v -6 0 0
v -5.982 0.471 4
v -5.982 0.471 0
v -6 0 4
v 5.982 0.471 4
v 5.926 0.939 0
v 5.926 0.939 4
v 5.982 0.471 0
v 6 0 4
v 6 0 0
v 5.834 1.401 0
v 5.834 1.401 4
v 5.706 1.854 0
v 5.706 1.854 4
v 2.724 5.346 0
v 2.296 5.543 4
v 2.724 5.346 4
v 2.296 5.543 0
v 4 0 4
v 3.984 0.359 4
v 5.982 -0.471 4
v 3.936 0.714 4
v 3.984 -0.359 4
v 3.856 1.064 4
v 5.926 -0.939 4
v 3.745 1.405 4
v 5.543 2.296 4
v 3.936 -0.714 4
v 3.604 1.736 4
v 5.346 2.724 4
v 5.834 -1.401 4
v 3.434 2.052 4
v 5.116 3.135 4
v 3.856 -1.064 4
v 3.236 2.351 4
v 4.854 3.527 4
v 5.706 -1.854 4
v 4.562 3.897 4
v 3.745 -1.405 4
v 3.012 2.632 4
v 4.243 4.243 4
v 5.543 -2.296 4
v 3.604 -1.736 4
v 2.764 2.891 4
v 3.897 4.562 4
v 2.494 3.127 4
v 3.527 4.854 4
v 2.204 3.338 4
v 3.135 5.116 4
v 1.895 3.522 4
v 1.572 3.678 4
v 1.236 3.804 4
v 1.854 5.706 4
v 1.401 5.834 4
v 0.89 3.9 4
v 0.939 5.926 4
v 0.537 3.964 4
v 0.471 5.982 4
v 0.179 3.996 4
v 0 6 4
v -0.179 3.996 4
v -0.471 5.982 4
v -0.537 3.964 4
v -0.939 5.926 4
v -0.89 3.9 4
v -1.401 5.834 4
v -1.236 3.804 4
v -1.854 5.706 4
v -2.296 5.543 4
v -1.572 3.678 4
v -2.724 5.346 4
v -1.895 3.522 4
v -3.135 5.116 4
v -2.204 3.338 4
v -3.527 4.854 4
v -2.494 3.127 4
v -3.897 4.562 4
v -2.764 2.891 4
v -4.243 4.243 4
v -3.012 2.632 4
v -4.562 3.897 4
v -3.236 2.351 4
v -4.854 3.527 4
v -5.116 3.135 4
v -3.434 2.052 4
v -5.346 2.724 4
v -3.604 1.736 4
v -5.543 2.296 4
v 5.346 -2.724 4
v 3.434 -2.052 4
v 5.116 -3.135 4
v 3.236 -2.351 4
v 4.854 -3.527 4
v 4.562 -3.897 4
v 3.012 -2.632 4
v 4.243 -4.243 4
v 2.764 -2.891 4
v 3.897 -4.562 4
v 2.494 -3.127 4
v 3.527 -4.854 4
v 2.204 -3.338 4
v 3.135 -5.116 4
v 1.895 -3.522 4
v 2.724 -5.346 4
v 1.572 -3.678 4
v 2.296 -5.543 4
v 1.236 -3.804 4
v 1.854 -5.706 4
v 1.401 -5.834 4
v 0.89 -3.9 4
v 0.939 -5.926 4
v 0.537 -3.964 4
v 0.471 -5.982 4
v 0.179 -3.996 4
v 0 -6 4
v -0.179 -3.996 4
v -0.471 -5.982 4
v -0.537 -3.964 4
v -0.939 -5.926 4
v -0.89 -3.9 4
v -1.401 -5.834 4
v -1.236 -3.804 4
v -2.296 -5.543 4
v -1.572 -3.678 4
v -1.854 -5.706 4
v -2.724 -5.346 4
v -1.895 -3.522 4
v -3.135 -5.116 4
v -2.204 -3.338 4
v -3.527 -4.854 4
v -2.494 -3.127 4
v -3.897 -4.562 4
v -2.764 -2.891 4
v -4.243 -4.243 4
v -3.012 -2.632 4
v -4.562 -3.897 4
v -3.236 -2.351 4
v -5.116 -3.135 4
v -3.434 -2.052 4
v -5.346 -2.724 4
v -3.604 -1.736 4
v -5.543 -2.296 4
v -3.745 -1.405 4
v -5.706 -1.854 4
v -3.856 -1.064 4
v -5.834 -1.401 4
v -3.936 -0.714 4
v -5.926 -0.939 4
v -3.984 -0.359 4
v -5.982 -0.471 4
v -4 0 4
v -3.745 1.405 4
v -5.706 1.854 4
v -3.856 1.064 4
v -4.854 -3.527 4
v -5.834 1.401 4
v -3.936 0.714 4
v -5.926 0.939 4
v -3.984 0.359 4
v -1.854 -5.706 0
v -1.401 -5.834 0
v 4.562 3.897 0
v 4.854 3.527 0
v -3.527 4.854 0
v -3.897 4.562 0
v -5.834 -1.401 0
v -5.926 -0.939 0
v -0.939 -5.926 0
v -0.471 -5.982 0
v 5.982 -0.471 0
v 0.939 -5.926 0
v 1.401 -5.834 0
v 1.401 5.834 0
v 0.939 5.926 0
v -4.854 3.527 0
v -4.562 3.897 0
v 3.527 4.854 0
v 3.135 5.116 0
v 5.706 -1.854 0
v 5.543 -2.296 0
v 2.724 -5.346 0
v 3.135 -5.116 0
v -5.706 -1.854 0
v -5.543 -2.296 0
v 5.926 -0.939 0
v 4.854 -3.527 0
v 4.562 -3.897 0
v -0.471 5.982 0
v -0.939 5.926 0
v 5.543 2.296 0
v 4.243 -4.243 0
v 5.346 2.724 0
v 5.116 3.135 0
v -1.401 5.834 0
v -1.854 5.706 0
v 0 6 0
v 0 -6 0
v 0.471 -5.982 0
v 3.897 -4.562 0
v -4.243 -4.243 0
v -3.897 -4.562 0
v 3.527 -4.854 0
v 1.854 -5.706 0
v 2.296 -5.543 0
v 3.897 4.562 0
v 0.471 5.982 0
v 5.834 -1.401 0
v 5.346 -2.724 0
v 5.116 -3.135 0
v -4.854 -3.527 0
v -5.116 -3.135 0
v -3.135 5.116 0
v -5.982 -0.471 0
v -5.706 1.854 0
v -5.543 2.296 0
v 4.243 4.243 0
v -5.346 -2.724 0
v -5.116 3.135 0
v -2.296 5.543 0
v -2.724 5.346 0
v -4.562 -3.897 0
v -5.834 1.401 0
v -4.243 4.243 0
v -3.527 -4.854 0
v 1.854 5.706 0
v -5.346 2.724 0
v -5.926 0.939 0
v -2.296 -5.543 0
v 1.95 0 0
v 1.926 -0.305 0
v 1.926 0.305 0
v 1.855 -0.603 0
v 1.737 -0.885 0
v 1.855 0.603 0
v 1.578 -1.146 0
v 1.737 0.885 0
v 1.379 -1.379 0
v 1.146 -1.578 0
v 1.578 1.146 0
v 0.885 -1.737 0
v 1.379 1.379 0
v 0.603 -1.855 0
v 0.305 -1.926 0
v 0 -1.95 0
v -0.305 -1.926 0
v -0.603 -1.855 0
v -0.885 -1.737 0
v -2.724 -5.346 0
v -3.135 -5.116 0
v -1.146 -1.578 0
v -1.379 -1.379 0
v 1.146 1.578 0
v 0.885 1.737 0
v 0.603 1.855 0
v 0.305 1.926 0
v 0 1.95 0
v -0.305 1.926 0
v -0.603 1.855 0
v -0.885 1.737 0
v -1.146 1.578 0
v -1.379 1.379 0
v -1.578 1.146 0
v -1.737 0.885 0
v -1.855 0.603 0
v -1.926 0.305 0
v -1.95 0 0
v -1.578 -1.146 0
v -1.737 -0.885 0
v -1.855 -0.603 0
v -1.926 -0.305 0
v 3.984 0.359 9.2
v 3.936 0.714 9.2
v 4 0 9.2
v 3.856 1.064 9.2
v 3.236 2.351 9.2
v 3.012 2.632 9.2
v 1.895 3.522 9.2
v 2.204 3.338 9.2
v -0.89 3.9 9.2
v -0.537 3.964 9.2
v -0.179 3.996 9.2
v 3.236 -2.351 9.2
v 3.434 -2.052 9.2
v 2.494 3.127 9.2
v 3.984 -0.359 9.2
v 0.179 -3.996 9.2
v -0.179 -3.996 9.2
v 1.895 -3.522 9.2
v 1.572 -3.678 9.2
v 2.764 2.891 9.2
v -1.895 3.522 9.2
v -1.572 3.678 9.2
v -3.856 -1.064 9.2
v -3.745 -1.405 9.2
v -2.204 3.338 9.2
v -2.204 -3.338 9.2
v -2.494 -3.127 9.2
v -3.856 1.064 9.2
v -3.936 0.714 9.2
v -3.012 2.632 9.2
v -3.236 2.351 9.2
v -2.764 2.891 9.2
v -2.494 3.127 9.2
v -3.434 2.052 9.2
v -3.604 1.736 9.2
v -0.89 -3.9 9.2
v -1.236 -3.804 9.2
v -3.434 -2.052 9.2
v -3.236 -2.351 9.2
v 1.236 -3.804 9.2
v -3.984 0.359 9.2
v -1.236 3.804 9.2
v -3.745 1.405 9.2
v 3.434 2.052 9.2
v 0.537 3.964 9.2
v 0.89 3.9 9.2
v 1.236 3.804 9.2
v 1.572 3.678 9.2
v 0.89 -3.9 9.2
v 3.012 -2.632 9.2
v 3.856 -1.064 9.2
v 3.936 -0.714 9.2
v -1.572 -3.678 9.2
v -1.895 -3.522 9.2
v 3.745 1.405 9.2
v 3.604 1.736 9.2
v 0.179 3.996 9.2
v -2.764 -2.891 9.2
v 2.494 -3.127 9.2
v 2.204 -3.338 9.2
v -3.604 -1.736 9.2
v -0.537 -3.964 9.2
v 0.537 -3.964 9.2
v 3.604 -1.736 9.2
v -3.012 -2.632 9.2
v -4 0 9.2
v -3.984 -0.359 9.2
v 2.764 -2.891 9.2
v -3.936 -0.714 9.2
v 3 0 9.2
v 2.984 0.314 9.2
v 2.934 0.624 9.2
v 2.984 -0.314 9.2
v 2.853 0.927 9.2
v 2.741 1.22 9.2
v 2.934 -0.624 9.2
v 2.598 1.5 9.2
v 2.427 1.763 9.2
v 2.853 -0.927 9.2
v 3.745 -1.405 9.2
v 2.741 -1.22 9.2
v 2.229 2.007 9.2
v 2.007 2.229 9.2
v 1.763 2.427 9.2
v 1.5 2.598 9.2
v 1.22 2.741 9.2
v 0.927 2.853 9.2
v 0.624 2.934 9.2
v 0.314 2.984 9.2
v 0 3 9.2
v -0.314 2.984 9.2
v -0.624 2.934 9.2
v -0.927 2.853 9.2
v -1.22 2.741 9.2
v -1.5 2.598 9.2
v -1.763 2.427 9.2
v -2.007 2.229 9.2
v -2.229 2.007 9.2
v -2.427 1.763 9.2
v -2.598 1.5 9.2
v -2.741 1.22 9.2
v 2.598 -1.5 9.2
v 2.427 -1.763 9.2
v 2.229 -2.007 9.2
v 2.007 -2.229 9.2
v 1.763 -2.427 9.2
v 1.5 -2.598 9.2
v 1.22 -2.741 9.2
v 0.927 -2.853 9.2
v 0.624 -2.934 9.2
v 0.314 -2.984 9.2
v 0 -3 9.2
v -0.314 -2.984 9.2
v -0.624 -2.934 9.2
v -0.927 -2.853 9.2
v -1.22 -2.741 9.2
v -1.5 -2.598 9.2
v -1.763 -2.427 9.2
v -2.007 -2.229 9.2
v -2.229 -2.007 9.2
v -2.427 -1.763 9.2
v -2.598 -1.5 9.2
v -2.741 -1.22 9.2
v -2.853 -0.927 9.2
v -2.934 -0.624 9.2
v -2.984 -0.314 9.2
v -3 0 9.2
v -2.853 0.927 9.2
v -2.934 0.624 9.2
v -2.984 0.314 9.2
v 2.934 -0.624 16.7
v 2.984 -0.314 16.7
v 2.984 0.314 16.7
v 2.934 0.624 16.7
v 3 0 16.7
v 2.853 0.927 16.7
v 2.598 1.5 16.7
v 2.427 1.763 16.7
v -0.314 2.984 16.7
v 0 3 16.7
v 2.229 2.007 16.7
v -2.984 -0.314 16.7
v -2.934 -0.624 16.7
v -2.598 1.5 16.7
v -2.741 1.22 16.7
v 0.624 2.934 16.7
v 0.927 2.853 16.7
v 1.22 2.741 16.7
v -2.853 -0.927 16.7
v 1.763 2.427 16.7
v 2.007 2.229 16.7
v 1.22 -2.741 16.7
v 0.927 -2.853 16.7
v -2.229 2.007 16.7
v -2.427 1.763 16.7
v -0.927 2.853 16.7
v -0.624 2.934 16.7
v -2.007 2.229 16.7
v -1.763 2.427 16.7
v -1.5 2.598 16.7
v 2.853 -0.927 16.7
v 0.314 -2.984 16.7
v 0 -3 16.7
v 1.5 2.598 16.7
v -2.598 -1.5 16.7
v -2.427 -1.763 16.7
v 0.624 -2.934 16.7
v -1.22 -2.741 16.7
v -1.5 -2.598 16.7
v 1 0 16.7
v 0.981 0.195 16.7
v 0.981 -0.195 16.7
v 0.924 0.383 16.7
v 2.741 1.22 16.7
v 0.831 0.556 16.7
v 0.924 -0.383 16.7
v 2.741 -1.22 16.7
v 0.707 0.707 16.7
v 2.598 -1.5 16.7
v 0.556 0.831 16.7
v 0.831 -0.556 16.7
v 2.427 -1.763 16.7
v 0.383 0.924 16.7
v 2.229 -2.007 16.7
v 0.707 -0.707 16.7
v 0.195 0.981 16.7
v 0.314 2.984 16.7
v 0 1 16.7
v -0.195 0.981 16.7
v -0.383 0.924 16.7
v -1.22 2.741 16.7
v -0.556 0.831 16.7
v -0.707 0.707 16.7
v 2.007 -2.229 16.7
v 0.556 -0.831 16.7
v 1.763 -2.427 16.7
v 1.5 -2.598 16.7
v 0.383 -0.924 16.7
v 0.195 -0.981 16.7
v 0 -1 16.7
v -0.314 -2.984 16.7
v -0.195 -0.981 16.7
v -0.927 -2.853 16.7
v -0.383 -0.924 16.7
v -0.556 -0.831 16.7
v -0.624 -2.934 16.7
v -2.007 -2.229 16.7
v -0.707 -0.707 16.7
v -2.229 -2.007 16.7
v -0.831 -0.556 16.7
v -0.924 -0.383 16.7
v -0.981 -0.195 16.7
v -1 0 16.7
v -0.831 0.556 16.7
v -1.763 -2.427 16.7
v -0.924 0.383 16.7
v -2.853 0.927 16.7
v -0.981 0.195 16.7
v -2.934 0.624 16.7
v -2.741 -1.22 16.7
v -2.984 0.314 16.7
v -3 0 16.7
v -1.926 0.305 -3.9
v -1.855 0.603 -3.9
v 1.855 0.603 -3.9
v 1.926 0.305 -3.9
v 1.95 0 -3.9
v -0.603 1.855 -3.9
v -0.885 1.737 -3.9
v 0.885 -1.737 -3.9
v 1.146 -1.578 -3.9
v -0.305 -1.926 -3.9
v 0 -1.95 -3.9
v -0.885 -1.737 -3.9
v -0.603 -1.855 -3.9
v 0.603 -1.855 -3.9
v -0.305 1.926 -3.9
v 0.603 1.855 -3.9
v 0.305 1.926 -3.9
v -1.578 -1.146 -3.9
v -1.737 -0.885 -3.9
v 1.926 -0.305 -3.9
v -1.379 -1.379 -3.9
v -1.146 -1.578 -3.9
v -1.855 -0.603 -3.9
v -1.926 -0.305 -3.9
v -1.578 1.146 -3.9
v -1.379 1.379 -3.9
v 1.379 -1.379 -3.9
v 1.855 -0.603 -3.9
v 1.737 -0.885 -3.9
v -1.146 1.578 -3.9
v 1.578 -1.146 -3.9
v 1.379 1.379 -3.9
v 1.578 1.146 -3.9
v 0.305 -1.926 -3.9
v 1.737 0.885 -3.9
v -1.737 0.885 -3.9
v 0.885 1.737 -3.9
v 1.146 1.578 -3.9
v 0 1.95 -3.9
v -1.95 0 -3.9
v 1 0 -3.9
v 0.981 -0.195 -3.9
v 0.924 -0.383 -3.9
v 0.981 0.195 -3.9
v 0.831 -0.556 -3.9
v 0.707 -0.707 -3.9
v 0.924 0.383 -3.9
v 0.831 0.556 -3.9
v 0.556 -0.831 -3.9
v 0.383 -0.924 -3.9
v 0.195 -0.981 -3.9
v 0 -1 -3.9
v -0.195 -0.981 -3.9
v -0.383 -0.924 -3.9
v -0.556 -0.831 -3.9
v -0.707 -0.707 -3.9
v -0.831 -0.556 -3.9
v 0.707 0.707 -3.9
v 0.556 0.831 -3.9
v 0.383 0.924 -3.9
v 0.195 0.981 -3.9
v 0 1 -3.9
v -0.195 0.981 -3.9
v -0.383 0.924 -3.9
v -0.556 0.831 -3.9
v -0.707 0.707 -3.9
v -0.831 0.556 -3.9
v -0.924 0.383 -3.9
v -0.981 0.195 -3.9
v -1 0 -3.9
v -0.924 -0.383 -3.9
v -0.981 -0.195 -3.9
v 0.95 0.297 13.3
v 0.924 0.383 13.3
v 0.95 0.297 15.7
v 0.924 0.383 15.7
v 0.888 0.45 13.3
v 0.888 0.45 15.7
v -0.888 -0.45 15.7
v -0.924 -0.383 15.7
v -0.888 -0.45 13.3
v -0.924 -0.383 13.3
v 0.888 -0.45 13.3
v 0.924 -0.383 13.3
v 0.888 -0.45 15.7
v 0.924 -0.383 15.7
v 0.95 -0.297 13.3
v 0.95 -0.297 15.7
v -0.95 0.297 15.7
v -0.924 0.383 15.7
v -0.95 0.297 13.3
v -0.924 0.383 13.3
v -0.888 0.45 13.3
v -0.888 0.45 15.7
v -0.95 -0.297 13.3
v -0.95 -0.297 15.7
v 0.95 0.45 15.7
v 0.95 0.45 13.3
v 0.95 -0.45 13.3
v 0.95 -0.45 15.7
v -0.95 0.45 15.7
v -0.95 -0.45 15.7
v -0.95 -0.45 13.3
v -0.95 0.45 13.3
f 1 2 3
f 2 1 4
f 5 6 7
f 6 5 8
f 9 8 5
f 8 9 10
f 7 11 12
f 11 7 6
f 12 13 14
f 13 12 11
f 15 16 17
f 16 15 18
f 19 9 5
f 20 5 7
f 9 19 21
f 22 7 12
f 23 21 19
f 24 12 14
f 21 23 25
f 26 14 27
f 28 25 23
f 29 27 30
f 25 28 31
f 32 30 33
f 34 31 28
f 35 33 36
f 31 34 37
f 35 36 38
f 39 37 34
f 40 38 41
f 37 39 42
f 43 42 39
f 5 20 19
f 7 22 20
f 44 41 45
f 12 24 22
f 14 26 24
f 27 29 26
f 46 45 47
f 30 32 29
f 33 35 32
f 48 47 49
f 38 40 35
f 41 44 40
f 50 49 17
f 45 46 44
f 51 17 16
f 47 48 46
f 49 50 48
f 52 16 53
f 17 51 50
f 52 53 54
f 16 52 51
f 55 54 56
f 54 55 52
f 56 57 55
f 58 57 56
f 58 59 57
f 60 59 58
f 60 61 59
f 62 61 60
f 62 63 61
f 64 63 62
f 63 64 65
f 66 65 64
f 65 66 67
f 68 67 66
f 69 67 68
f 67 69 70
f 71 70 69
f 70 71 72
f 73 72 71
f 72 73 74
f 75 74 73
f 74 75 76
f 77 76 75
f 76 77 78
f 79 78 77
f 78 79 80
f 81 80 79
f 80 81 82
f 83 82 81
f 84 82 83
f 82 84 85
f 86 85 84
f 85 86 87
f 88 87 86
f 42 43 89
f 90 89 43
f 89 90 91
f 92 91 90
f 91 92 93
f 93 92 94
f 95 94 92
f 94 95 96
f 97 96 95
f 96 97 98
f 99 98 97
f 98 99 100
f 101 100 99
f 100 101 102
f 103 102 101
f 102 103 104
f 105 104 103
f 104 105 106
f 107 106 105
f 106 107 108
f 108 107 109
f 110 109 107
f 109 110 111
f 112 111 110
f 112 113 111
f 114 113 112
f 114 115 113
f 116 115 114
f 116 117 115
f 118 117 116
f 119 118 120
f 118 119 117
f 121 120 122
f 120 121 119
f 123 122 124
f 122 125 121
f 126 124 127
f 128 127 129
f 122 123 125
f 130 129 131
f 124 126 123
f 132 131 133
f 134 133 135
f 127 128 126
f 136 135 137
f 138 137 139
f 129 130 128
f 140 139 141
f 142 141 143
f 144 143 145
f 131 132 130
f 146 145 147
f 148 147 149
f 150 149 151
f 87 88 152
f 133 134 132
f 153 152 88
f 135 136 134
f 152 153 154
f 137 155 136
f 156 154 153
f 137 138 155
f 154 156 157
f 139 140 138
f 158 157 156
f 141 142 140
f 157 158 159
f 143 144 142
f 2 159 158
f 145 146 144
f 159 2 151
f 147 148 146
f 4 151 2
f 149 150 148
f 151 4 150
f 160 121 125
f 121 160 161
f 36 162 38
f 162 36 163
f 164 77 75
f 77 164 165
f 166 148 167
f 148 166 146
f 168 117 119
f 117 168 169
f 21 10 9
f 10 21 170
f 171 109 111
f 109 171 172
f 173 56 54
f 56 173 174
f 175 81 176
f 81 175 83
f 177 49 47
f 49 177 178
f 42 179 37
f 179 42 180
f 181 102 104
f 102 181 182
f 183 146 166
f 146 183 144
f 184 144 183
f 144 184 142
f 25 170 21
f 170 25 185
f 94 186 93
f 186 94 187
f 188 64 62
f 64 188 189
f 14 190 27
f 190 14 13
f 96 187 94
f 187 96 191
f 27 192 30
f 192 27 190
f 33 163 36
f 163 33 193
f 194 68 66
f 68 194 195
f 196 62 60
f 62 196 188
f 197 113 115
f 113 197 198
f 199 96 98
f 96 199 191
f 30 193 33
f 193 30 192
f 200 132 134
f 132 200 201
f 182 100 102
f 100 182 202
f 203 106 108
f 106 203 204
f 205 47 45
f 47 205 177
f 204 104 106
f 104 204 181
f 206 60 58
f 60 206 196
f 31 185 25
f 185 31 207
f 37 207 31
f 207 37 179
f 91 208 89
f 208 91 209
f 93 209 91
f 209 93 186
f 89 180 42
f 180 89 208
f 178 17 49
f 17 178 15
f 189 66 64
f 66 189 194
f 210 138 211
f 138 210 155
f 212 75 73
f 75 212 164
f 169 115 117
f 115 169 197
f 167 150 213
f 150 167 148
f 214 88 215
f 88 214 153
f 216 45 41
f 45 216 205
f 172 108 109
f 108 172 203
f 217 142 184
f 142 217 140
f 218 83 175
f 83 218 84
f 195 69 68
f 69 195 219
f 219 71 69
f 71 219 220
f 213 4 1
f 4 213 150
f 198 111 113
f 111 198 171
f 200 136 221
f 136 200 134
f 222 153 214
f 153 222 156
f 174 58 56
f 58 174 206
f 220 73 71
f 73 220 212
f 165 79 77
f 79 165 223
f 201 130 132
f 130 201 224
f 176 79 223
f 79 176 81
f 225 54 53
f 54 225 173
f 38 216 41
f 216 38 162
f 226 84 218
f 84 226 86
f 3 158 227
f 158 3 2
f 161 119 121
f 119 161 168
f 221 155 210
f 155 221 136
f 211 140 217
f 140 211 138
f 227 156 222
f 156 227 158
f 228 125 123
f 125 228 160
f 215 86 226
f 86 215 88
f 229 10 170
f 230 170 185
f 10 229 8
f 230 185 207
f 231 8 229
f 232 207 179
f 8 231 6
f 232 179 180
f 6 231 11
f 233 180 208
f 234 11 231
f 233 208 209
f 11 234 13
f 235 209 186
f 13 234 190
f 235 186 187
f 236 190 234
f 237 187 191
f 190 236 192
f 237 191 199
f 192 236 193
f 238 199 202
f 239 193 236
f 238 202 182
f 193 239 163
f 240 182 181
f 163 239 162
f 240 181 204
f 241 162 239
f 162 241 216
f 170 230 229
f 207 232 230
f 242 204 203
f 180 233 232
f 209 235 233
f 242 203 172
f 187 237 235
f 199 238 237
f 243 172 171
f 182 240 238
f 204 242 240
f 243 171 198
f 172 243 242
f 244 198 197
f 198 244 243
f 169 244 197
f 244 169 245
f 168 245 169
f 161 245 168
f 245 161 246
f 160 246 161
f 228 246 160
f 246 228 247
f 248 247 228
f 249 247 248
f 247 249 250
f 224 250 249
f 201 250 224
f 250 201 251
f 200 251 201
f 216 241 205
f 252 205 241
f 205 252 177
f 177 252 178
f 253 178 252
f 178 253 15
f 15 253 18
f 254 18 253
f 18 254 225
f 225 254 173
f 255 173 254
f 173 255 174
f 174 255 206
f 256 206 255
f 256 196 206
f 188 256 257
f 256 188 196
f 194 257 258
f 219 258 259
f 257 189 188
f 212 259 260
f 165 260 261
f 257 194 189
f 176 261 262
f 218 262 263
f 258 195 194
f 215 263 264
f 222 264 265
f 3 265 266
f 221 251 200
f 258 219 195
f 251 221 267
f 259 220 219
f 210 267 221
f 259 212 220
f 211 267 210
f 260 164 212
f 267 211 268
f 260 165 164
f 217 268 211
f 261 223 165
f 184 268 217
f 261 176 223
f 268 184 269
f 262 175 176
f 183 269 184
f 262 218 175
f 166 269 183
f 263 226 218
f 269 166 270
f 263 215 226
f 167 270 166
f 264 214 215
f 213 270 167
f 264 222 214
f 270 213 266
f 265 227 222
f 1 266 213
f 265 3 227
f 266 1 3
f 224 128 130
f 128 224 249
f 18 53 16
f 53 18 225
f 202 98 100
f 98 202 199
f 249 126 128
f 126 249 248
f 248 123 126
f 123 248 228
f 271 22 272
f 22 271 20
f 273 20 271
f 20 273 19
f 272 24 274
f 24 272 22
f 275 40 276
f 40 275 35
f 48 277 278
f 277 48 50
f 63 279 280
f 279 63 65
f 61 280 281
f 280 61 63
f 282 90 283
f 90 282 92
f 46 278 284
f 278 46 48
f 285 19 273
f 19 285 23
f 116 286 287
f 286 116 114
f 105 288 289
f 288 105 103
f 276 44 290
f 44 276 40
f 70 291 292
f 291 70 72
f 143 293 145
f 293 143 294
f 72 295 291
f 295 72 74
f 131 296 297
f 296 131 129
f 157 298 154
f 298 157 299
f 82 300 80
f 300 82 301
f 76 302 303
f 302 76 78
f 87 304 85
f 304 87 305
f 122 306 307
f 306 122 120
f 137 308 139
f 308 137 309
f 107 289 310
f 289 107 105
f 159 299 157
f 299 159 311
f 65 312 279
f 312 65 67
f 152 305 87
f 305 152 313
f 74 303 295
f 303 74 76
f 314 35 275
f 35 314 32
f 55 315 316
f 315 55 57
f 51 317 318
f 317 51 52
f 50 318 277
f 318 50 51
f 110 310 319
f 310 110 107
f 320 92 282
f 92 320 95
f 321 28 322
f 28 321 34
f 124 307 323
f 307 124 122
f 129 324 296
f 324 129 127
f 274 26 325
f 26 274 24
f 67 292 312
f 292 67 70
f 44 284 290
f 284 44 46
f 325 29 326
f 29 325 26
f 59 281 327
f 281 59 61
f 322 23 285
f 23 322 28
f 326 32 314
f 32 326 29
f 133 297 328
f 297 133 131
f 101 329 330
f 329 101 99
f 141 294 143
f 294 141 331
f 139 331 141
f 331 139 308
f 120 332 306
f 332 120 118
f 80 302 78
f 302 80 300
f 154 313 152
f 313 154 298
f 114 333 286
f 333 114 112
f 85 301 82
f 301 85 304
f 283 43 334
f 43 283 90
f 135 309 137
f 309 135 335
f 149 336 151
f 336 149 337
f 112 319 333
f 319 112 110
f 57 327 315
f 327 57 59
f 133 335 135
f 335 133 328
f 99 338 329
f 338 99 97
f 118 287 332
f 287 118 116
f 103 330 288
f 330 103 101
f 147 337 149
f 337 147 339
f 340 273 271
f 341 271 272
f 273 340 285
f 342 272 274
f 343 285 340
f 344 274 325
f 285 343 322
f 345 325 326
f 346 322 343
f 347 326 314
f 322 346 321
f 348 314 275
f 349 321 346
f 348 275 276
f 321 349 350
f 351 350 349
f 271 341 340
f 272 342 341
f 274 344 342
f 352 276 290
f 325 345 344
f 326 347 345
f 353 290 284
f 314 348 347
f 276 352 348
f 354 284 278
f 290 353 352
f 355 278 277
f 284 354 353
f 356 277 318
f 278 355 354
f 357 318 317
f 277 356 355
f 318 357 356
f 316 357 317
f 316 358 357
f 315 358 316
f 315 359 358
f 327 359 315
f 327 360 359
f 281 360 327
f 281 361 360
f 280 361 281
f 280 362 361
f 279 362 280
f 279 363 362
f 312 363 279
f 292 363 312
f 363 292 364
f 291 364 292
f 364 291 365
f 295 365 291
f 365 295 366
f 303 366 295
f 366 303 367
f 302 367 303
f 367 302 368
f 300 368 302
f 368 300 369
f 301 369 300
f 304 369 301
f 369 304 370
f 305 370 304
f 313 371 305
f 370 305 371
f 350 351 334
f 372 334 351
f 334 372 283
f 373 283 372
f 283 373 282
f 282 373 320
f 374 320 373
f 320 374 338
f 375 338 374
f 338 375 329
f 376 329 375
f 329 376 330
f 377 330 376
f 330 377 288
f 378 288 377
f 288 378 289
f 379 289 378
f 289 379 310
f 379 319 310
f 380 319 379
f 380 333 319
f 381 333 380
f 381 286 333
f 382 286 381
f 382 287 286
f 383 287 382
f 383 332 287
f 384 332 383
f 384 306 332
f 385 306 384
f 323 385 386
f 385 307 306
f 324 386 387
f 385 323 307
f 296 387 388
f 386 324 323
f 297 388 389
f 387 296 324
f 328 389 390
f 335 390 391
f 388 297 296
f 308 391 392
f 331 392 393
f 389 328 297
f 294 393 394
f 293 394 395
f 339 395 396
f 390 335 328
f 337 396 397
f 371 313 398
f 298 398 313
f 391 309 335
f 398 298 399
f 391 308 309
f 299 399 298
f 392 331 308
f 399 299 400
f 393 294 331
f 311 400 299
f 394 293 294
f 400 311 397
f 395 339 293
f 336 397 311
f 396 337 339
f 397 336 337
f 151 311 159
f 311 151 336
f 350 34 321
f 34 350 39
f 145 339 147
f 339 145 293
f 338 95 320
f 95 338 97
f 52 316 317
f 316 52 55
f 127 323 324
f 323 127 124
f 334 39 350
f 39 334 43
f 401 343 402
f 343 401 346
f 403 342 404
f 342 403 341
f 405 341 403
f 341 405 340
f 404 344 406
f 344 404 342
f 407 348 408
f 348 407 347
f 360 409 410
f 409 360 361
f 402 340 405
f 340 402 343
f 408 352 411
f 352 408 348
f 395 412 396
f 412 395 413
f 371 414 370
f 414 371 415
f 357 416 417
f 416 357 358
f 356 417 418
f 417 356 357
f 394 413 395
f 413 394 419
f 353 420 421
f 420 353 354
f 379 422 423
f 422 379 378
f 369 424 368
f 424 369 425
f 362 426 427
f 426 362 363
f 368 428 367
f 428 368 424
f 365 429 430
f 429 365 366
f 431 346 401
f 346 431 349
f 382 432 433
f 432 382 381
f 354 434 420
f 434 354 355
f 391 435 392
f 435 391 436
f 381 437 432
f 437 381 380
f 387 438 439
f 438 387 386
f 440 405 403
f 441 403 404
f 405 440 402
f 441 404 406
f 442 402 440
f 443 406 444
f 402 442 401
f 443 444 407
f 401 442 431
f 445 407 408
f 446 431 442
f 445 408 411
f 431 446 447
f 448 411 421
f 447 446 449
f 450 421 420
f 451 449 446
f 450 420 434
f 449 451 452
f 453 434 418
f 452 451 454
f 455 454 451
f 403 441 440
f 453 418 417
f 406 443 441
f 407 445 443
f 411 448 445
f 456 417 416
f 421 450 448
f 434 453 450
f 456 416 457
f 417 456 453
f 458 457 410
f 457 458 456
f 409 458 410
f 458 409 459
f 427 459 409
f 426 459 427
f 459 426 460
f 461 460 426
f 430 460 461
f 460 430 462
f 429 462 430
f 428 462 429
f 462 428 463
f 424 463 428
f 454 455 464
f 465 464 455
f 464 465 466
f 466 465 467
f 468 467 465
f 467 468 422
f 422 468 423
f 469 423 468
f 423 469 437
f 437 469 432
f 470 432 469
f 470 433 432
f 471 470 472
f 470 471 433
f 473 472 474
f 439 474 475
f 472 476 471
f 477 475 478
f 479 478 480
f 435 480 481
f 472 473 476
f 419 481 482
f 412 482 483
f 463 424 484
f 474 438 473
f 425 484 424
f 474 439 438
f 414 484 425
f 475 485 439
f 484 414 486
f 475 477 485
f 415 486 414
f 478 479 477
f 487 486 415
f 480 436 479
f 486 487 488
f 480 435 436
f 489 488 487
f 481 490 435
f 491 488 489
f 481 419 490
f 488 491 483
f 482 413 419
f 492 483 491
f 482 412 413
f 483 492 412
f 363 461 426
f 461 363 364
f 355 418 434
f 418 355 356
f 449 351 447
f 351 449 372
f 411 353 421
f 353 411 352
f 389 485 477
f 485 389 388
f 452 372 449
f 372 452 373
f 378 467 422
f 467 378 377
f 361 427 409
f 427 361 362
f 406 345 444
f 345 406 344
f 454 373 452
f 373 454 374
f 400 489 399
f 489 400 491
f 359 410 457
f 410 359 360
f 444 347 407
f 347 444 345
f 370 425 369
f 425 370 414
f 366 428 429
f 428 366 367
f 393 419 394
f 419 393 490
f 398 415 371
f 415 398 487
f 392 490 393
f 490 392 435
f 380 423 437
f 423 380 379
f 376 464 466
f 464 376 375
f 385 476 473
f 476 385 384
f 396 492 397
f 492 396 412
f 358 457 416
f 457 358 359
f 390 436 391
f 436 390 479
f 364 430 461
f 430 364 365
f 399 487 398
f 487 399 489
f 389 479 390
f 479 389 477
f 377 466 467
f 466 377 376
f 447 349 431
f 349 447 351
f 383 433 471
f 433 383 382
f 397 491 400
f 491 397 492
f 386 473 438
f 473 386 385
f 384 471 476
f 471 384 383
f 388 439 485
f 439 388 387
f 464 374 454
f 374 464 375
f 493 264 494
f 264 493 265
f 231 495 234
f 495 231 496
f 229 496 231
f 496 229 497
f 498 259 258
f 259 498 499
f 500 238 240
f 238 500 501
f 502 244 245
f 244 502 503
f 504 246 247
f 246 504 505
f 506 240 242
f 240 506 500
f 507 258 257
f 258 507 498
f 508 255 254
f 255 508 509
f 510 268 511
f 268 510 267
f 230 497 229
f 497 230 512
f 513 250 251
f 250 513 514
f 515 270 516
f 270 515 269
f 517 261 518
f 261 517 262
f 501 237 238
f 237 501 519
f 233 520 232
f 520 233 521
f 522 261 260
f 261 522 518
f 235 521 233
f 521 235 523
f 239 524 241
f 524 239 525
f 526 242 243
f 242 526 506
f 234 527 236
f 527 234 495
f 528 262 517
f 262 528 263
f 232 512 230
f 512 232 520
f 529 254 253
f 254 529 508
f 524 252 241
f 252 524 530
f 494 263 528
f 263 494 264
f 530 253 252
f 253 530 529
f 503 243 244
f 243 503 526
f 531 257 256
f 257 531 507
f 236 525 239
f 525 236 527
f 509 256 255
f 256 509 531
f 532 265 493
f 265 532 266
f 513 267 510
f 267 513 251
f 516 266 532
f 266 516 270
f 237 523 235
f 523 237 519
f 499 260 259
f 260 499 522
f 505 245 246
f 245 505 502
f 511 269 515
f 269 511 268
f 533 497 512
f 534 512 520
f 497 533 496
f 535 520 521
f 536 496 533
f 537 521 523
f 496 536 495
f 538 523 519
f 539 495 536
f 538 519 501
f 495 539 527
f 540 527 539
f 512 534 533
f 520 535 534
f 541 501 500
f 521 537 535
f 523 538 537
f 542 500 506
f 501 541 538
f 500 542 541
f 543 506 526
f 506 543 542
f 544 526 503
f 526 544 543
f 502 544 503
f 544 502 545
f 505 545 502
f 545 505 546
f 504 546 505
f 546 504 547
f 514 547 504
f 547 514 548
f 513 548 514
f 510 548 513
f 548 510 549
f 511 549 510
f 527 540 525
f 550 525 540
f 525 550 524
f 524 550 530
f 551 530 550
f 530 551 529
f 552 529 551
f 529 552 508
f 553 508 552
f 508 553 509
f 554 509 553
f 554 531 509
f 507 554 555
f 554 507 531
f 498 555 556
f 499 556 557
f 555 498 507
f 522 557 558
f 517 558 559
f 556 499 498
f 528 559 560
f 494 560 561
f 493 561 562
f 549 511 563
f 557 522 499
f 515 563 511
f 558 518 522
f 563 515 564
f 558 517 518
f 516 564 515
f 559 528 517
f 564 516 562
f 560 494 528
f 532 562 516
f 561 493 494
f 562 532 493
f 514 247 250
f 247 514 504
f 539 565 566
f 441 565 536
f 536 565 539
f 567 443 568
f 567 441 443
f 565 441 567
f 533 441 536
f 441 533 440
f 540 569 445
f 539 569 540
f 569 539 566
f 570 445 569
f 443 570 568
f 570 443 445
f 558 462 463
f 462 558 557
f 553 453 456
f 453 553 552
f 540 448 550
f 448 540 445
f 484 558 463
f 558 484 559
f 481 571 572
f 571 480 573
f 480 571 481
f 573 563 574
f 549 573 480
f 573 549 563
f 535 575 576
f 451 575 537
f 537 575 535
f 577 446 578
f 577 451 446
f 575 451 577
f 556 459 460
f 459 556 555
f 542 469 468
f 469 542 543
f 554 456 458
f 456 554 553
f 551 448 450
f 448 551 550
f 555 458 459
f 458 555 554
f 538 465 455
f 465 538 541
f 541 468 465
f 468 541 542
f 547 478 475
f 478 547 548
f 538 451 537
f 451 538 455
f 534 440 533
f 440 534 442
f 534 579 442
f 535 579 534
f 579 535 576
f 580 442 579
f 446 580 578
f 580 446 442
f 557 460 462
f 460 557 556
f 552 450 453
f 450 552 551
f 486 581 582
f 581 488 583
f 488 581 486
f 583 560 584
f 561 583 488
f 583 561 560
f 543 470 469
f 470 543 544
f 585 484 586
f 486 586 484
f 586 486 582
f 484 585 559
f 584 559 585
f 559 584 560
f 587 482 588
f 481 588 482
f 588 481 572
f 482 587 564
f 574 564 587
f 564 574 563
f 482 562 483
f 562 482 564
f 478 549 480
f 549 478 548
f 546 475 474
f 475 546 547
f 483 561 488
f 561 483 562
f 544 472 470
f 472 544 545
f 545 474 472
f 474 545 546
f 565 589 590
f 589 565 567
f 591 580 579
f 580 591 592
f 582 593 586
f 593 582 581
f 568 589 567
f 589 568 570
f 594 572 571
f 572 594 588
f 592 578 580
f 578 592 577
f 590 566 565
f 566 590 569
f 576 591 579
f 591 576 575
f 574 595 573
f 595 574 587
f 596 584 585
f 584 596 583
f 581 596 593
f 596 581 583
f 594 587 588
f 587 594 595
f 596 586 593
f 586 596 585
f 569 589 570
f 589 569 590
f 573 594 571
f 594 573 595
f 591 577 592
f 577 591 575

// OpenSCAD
// part_id: i2
// name: Exeligmos stepped hub
// source_drawing_ids: DRW-009
// units: mm
// revision: 0.1
// SPDX-License-Identifier: MIT

module part_i2(
    flange_d = 12.0,
    flange_h = 4.0,
    mid_d = 8.0,
    mid_h = 5.2,
    top_d = 6.0,
    top_h = 7.5,
    neck_d = 3.9,
    neck_h = 3.9,
    through_d = 2.0
) {
    difference() {
        union() {
            cylinder(d = flange_d, h = flange_h, center = false, $fn = 80);
            translate([0, 0, flange_h]) cylinder(d = mid_d, h = mid_h, center = false, $fn = 70);
            translate([0, 0, flange_h + mid_h]) cylinder(d = top_d, h = top_h, center = false, $fn = 60);
            translate([0, 0, -neck_h]) cylinder(d = neck_d, h = neck_h, center = false, $fn = 40);
        }
        translate([0, 0, -neck_h - 0.05]) cylinder(d = through_d, h = flange_h + mid_h + top_h + neck_h + 0.1, $fn = 32);
        translate([0, 0, flange_h + mid_h + top_h - 2.2]) cube([1.9, 0.9, 2.4], center = true);
    }
}

// ---- "main guard" ----
// Default to previewing when opened directly:
if (is_undef(__LIB_MODE__)) {
    part_i2();
}
